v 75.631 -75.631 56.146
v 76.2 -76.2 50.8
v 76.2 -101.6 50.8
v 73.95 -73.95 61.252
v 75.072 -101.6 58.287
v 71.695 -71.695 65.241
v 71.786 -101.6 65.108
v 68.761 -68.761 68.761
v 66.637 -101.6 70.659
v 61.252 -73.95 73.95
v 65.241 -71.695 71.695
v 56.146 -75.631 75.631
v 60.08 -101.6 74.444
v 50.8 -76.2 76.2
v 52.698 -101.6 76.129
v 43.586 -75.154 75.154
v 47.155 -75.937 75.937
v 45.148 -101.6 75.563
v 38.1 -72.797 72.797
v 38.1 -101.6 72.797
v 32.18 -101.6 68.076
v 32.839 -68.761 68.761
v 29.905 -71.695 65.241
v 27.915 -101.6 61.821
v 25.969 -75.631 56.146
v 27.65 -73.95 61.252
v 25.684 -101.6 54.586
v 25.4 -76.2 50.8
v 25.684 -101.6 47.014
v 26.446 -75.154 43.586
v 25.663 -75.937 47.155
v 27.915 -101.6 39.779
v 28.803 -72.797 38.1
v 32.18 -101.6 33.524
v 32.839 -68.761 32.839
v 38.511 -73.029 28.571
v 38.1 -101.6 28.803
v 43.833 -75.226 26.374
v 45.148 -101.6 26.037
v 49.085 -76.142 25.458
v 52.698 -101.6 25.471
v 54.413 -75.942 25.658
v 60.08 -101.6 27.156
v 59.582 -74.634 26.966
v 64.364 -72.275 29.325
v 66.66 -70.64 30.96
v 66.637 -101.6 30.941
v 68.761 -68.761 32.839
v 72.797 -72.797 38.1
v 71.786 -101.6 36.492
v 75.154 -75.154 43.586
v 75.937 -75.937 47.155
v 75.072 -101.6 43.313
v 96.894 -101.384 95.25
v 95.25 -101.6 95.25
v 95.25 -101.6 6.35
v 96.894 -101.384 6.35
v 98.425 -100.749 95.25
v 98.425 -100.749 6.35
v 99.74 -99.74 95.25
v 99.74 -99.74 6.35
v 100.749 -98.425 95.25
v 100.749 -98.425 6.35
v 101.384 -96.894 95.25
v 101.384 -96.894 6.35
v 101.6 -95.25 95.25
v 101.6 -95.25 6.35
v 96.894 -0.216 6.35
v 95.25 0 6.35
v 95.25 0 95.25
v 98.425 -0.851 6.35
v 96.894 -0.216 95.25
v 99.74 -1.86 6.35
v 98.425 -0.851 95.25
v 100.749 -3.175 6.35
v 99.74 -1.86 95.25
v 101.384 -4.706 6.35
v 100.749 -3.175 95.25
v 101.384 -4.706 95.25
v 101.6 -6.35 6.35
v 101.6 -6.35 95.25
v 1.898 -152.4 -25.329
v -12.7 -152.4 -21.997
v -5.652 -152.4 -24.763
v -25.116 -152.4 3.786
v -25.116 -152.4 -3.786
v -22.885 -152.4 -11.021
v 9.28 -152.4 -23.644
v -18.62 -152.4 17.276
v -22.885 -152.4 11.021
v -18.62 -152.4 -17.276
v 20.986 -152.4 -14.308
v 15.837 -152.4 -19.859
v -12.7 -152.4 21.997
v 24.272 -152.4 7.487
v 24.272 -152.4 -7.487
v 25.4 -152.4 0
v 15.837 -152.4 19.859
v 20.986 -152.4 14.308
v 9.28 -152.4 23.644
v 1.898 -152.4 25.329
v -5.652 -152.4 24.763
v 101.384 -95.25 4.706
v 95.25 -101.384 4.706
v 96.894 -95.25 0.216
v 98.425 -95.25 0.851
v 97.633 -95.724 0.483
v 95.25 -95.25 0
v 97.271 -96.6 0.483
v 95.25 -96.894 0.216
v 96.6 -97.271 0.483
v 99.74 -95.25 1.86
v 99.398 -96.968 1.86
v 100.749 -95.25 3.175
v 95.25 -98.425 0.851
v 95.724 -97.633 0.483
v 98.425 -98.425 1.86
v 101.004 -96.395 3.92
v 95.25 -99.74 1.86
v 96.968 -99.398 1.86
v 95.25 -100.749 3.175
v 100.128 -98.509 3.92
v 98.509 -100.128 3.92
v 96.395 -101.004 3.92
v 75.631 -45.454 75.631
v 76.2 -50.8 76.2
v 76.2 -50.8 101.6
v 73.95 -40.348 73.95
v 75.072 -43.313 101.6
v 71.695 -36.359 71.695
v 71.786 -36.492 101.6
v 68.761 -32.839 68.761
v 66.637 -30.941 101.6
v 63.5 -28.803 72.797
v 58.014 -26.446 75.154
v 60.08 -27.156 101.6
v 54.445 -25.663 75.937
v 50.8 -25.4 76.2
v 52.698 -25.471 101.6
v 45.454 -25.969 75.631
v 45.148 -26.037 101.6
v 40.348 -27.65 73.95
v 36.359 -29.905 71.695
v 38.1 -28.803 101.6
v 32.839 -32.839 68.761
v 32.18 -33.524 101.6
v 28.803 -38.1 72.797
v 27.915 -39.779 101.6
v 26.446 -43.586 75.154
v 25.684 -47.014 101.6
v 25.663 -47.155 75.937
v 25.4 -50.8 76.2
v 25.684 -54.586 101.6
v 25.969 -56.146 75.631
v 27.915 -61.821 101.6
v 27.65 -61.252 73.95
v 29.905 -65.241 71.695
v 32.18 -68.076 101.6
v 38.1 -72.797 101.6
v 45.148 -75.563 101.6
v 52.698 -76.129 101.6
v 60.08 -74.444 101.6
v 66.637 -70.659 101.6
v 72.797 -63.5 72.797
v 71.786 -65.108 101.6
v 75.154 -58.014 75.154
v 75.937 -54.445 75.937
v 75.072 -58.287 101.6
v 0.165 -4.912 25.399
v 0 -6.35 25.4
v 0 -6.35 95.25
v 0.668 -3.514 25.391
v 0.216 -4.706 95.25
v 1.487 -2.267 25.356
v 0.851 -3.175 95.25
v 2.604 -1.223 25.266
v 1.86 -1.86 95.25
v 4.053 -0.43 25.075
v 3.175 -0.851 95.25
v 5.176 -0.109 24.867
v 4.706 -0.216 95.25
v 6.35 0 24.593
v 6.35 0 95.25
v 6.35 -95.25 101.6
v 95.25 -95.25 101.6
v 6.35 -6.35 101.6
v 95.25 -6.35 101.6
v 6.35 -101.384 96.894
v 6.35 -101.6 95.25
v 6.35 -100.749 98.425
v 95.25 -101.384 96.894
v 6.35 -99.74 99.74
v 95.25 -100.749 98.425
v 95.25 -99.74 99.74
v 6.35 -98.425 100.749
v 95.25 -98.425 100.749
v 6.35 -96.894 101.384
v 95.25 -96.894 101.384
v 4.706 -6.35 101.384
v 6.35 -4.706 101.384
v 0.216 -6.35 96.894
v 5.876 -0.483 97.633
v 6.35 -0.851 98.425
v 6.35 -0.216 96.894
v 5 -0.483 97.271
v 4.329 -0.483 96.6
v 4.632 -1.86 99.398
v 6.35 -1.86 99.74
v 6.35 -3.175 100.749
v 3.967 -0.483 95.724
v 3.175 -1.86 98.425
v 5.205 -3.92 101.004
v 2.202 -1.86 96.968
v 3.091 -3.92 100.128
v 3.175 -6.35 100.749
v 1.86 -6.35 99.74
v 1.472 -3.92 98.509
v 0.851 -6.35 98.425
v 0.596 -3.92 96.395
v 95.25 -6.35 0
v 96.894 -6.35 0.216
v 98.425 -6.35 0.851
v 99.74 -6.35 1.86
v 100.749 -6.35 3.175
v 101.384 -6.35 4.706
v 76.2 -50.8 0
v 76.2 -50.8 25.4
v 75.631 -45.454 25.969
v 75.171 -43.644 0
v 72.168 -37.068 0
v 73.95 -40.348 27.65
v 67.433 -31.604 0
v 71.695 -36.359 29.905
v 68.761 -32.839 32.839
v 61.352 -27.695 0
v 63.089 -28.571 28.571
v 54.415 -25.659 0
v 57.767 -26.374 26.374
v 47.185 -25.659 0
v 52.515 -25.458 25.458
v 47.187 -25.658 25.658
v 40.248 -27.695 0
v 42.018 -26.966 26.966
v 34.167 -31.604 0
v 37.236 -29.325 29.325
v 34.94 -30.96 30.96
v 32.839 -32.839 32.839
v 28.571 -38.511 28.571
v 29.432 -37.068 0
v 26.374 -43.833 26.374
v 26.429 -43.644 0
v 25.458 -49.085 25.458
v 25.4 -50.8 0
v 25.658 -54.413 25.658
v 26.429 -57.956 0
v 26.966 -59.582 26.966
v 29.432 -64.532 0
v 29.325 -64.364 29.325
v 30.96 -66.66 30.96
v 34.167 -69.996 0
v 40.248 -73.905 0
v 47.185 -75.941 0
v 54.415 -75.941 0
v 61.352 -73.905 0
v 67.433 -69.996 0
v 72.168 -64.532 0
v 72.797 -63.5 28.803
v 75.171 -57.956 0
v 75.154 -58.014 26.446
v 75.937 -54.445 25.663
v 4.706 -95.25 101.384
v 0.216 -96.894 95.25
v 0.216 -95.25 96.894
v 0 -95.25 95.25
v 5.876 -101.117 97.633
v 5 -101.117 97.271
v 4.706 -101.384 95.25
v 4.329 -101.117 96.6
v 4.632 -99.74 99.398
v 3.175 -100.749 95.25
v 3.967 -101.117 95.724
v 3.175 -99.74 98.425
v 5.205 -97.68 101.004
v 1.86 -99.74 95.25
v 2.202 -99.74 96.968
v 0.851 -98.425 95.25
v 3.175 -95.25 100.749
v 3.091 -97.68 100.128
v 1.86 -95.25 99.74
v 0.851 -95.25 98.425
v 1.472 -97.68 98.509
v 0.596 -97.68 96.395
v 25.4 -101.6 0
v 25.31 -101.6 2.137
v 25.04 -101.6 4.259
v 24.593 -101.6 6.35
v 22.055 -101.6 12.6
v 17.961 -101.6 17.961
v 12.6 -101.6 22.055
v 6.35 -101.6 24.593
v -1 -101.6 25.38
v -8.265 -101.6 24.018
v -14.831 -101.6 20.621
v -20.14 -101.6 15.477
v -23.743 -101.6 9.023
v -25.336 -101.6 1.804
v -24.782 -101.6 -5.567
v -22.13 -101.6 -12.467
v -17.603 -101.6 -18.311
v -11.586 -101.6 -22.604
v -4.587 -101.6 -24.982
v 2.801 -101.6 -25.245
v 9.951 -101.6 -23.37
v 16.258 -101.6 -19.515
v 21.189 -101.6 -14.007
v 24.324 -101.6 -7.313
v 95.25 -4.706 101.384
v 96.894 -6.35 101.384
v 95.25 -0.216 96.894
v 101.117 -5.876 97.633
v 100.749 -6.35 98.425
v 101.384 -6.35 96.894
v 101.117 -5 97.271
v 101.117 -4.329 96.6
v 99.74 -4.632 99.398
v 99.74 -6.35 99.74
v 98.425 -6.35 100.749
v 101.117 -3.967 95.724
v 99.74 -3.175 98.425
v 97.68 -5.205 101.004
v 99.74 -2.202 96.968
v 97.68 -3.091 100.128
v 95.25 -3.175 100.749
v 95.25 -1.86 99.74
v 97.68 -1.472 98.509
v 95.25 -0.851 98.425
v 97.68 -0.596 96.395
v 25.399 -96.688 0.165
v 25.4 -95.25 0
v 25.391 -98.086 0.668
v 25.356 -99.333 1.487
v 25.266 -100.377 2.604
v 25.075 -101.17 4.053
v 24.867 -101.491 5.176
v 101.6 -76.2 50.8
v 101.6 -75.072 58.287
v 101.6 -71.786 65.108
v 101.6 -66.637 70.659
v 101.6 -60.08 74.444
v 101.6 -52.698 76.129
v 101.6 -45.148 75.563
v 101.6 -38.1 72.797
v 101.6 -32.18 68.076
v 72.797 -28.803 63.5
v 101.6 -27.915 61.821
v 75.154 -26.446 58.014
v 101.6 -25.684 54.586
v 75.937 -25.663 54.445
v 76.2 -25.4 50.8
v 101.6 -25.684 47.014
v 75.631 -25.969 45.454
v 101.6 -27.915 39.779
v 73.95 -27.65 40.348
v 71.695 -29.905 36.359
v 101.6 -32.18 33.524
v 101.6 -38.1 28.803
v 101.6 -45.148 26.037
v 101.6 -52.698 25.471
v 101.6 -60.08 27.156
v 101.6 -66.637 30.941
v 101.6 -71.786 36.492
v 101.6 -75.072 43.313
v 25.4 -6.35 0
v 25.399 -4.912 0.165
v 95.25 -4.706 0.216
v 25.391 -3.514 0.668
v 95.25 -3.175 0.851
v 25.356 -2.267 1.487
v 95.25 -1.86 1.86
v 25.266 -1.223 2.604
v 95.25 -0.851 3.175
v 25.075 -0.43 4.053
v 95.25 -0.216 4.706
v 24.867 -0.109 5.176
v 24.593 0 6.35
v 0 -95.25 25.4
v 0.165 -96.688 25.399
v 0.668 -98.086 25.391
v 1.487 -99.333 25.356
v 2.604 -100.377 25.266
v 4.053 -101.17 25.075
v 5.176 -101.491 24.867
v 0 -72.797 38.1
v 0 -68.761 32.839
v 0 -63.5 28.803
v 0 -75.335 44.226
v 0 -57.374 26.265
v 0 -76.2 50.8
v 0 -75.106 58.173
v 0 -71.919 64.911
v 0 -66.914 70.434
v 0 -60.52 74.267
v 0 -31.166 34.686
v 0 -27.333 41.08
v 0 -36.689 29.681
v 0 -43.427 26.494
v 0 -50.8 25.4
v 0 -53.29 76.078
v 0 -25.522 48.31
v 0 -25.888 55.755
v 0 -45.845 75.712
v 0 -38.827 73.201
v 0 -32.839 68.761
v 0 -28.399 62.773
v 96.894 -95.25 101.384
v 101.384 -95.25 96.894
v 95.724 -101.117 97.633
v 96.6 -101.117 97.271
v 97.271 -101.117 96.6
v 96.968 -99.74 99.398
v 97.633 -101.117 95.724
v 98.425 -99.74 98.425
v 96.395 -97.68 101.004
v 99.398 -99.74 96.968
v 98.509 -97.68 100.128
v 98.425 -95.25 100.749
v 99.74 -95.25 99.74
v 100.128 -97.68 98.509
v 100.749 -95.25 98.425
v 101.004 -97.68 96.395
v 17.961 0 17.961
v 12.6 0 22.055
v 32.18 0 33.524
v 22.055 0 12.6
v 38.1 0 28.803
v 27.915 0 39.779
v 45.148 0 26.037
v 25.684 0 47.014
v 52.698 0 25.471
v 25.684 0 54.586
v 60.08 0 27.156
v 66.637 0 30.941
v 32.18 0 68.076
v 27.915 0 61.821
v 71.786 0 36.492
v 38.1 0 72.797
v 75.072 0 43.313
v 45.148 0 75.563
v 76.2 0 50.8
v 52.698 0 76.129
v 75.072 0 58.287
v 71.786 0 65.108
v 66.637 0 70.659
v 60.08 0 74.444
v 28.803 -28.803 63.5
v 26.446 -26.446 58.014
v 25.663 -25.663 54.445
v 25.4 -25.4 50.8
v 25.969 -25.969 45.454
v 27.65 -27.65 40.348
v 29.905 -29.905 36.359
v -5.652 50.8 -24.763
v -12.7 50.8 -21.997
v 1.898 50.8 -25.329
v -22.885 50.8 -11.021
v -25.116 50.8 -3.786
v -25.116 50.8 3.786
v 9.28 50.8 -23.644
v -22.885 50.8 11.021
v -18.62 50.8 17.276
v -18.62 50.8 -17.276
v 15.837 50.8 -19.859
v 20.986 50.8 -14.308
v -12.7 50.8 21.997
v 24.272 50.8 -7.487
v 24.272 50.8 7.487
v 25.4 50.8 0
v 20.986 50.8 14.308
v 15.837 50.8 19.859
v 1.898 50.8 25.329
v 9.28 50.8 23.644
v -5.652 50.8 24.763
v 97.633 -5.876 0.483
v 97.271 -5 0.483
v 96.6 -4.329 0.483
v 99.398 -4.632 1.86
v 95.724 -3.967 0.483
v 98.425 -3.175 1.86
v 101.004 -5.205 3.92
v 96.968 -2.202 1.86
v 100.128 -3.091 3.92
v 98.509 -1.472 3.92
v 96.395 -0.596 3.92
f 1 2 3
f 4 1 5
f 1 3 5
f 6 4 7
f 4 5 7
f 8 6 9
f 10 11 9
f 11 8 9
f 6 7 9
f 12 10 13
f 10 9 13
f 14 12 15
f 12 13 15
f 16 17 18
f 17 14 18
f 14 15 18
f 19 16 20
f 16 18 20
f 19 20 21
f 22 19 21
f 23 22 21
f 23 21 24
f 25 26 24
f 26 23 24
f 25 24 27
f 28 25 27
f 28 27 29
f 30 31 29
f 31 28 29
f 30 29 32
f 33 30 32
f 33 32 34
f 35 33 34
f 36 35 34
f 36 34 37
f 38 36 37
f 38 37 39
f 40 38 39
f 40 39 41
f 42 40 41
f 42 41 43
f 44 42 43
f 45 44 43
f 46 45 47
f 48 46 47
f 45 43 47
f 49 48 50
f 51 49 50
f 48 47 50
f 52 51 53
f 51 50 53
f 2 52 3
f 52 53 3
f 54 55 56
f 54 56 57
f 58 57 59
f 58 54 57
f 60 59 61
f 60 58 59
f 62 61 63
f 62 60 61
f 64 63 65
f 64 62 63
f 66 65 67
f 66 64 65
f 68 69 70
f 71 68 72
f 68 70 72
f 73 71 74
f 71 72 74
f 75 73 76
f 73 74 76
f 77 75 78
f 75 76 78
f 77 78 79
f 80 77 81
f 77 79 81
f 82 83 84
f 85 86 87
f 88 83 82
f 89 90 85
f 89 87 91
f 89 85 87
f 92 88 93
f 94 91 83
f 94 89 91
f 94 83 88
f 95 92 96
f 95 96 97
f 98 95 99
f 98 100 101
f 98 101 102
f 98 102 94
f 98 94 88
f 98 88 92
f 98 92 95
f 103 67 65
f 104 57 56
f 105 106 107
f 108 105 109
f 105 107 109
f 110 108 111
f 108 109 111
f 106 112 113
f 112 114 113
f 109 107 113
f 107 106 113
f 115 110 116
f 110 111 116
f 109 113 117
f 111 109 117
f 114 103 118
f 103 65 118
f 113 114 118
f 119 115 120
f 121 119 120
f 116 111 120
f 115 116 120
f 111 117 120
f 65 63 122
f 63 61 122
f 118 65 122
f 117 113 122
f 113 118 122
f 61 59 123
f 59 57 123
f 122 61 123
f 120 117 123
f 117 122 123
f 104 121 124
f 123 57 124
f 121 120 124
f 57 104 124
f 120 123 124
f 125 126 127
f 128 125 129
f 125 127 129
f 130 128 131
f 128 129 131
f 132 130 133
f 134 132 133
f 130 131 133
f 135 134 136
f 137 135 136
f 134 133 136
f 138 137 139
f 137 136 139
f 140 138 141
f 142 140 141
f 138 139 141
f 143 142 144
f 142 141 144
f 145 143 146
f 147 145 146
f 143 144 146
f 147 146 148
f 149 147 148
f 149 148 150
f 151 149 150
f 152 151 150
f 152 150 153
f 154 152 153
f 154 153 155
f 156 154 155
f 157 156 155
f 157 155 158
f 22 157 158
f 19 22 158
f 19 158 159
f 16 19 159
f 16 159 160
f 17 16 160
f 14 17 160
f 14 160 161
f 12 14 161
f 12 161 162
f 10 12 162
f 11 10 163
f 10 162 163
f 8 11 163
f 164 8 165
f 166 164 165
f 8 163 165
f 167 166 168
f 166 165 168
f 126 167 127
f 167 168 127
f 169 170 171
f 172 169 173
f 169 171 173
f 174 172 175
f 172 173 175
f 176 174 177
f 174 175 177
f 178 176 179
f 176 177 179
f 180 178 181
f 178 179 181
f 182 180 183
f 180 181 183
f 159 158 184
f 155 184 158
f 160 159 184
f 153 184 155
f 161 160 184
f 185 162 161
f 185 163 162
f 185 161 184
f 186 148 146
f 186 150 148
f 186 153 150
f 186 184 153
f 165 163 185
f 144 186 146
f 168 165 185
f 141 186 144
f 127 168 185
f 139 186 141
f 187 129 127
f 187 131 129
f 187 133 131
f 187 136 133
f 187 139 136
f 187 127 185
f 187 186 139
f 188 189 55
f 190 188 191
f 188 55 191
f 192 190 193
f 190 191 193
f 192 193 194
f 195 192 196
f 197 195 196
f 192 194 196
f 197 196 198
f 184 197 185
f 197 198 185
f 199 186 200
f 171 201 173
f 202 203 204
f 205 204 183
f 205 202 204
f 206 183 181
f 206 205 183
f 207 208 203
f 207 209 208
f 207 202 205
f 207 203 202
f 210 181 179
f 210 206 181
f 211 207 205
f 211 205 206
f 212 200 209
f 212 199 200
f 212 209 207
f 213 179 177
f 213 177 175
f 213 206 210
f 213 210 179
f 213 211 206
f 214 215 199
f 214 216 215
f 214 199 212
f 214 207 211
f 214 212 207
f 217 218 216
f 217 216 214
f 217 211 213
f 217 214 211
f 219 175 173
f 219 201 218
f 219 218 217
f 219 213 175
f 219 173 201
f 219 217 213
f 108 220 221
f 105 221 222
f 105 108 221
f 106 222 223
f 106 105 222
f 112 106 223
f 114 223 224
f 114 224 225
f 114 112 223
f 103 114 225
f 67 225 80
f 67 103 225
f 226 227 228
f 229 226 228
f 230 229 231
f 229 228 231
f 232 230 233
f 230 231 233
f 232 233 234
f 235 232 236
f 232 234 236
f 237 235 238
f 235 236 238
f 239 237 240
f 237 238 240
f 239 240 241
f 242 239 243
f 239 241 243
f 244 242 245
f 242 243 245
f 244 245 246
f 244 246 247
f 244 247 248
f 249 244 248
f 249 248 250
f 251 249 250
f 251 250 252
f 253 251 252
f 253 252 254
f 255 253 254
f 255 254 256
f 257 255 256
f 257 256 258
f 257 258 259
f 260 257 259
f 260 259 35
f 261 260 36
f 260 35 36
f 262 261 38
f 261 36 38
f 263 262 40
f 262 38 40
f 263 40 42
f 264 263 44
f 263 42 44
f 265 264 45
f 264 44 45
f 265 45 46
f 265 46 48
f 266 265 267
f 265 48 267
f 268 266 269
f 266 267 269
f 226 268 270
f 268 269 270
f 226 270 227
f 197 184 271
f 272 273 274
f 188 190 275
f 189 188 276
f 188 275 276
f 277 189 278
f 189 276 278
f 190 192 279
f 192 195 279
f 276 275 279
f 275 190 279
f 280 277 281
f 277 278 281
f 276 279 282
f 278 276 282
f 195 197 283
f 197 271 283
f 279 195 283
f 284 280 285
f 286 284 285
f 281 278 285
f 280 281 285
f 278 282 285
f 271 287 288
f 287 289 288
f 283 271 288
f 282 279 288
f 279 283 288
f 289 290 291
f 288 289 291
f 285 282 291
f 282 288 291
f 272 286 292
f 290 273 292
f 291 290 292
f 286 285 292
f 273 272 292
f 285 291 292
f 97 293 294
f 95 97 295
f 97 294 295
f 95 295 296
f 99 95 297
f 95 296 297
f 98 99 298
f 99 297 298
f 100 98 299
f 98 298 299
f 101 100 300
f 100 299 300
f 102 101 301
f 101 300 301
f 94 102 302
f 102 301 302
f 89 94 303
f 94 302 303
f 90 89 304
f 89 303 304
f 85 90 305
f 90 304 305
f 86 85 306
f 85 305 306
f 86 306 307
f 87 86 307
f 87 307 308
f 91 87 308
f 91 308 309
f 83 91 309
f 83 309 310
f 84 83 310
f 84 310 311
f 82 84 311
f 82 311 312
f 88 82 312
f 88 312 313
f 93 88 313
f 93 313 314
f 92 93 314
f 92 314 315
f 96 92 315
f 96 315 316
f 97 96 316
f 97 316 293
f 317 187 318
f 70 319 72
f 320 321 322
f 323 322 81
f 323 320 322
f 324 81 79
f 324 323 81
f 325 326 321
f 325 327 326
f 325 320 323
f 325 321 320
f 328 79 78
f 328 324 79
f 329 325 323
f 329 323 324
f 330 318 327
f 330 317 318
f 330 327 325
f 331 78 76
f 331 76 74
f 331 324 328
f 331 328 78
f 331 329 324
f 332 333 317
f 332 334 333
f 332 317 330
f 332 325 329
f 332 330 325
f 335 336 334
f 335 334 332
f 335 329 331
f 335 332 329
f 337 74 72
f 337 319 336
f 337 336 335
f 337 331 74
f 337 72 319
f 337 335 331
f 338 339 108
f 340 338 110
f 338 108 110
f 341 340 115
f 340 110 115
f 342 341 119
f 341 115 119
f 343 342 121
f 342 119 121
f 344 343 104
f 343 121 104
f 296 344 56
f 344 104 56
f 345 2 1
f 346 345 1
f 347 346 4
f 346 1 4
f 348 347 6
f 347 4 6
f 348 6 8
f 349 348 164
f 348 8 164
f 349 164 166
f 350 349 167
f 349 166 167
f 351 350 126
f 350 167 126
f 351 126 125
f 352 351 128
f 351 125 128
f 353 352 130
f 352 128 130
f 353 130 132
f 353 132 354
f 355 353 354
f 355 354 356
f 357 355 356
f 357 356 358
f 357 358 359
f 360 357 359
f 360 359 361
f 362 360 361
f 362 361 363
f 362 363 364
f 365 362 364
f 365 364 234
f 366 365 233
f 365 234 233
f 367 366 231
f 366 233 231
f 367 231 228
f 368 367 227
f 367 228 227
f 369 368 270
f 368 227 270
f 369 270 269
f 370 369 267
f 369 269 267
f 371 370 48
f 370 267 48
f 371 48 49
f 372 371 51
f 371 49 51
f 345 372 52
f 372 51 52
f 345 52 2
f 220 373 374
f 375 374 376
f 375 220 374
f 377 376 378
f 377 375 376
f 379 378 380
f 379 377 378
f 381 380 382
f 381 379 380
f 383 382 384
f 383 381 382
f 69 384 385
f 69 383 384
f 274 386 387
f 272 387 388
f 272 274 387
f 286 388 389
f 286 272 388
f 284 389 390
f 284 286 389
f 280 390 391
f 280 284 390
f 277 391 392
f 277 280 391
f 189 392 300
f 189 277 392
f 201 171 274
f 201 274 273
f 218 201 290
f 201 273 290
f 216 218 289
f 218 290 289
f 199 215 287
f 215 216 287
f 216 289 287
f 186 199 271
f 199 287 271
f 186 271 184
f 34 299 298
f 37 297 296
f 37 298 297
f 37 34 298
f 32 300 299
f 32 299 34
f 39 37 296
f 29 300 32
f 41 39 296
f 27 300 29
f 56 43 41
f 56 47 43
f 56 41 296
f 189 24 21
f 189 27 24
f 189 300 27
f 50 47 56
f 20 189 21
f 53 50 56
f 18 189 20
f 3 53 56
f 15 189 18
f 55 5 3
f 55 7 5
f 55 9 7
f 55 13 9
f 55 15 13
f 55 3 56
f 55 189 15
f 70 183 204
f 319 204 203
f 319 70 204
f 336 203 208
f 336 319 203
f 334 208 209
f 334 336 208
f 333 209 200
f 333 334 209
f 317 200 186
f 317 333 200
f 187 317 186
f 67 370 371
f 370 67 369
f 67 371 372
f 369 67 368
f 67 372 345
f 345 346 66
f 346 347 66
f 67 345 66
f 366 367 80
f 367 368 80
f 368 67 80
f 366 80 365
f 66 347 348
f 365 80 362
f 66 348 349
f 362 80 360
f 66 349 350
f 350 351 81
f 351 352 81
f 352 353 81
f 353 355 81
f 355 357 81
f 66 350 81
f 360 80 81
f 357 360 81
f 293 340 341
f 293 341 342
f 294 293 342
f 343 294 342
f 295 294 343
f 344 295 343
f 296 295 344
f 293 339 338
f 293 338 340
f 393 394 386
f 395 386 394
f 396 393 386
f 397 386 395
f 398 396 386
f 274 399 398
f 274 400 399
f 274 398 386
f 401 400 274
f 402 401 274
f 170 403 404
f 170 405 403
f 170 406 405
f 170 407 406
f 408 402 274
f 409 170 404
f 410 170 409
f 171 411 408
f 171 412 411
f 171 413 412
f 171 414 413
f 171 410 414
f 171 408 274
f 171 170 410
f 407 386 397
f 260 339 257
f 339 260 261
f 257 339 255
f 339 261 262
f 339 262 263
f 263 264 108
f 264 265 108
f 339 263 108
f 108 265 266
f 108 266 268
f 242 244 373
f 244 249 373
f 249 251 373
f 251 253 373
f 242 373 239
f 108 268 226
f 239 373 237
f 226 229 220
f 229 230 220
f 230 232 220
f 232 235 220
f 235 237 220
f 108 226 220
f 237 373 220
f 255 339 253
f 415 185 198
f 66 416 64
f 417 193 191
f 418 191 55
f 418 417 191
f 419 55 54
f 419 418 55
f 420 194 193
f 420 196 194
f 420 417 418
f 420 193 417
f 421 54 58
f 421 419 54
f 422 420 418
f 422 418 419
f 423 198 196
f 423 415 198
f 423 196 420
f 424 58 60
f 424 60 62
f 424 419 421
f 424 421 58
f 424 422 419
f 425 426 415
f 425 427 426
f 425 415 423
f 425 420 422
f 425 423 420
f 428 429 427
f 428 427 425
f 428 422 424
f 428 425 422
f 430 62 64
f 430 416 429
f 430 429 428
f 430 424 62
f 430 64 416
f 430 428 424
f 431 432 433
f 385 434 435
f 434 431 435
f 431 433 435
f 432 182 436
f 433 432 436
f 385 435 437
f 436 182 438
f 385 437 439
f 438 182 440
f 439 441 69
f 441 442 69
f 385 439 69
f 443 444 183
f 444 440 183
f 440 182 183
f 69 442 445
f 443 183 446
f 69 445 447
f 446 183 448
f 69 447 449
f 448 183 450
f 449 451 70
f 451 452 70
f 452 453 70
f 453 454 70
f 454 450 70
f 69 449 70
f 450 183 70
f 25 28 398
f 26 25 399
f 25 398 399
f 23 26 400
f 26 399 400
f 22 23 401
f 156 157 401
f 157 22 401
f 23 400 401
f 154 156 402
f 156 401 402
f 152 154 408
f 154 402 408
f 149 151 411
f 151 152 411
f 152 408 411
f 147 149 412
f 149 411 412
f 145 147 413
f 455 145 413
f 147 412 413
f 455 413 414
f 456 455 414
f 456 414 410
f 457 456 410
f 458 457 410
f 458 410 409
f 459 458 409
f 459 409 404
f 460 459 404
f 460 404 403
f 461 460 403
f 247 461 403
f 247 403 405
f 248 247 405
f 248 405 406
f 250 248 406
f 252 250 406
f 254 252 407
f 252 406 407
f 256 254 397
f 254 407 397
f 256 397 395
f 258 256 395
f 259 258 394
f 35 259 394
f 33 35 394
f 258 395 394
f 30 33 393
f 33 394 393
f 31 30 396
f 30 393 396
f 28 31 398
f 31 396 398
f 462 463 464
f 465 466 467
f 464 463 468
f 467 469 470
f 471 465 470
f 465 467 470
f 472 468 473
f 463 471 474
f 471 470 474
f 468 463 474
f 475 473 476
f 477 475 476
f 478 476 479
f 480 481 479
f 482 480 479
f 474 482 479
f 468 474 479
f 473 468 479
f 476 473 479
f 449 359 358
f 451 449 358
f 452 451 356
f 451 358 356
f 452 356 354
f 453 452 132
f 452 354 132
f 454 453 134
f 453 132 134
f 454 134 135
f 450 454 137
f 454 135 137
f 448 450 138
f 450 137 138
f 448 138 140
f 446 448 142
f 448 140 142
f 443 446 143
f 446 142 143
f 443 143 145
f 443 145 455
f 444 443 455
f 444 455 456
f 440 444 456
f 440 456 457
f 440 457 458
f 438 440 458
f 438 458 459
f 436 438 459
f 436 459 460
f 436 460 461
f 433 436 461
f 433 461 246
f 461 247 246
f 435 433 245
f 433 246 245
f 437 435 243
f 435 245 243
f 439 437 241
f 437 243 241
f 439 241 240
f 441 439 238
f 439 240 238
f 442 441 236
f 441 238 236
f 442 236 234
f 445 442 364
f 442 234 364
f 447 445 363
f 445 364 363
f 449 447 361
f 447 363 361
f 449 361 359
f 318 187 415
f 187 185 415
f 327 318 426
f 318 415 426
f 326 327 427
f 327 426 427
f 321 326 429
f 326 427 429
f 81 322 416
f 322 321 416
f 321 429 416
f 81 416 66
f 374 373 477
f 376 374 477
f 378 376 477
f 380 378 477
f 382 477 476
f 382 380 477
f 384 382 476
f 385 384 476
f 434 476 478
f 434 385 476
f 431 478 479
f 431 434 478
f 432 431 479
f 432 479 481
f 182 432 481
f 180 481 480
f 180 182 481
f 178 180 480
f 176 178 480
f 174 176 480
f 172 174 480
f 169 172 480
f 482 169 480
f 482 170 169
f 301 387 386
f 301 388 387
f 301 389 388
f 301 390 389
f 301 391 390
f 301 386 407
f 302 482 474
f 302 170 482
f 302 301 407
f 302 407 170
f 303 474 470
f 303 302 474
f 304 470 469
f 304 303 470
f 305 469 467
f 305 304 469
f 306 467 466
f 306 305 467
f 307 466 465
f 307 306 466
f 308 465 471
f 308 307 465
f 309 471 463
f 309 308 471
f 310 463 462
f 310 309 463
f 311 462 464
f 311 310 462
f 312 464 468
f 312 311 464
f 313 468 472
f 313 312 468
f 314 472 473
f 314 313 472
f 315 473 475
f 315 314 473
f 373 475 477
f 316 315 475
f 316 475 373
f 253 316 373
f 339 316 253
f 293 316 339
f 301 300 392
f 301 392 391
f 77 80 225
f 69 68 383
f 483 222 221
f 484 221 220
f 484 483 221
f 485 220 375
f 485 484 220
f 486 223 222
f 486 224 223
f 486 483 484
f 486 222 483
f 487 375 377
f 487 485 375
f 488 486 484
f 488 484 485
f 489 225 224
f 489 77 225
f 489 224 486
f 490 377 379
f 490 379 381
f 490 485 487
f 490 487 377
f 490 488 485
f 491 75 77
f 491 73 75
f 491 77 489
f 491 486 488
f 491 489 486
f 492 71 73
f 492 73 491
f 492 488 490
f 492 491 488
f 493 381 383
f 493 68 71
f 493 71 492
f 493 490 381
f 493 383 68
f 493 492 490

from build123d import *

# Parameters (mm, degrees)
F0_W           = 101.6
F0_H           = 101.6
F1_DEPTH       = 101.6
F2_R           = 25.4
F3_DEPTH       = 101.6
F4_R           = 25.4
F5_DEPTH       = 101.6
F6_R           = 25.4
F7_DEPTH       = 101.6
F8_R           = 6.35
F10_R          = 25.4
F11_DEPTH      = 50.8
F11_DEPTH_BACK = 152.4


with BuildPart() as f1:
    # F0 (on Front) → F1 (new body)
    with BuildSketch(Plane.XZ):
        with Locations((50.8, 50.8)):
            Rectangle(F0_W, F0_H)
    extrude(amount=F1_DEPTH)

    # F2 (on face) → F3 (cut)
    with BuildSketch(Plane.XY.offset(101.6)):
        with Locations((50.8, -50.8)):
            Circle(F2_R)
    extrude(amount=-F3_DEPTH, mode=Mode.SUBTRACT)

    # F4 (on face) → F5 (cut)
    with BuildSketch(Plane(origin=(0, 0, 0), x_dir=(0, -1, 0), z_dir=(-1, 0, 0))):
        with Locations((50.8, 50.8)):
            Circle(F4_R)
    extrude(amount=-F5_DEPTH, mode=Mode.SUBTRACT)

    # F6 (on face) → F7 (cut)
    with BuildSketch(Plane.XZ.offset(101.6)):
        with Locations((50.8, 50.8)):
            Circle(F6_R)
    extrude(amount=-F7_DEPTH, mode=Mode.SUBTRACT)

    # F8
    f8_edges = [f1.edges().sort_by_distance(p)[0] for p in [
        (0, -50.8, 101.6),
        (50.8, 0, 101.6),
        (101.6, -50.8, 101.6),
        (50.8, -101.6, 101.6),
        (0, -101.6, 50.8),
        (101.6, -101.6, 50.8),
        (101.6, 0, 50.8),
        (101.6, -50.8, 0),
        (50.8, -101.6, 0),
        (50.8, 0, 0),
        (0, 0, 50.8),
        (0, -50.8, 0),
    ]]
    fillet(f8_edges, radius=F8_R)

    # F10 (on offset) → F11 (join, two sides)
    with BuildSketch(Plane.XZ.offset(101.6)) as f11_sk:
        Circle(F10_R)
    extrude(amount=F11_DEPTH)
    extrude(f11_sk.sketch, amount=-F11_DEPTH_BACK)


solid = f1.part
